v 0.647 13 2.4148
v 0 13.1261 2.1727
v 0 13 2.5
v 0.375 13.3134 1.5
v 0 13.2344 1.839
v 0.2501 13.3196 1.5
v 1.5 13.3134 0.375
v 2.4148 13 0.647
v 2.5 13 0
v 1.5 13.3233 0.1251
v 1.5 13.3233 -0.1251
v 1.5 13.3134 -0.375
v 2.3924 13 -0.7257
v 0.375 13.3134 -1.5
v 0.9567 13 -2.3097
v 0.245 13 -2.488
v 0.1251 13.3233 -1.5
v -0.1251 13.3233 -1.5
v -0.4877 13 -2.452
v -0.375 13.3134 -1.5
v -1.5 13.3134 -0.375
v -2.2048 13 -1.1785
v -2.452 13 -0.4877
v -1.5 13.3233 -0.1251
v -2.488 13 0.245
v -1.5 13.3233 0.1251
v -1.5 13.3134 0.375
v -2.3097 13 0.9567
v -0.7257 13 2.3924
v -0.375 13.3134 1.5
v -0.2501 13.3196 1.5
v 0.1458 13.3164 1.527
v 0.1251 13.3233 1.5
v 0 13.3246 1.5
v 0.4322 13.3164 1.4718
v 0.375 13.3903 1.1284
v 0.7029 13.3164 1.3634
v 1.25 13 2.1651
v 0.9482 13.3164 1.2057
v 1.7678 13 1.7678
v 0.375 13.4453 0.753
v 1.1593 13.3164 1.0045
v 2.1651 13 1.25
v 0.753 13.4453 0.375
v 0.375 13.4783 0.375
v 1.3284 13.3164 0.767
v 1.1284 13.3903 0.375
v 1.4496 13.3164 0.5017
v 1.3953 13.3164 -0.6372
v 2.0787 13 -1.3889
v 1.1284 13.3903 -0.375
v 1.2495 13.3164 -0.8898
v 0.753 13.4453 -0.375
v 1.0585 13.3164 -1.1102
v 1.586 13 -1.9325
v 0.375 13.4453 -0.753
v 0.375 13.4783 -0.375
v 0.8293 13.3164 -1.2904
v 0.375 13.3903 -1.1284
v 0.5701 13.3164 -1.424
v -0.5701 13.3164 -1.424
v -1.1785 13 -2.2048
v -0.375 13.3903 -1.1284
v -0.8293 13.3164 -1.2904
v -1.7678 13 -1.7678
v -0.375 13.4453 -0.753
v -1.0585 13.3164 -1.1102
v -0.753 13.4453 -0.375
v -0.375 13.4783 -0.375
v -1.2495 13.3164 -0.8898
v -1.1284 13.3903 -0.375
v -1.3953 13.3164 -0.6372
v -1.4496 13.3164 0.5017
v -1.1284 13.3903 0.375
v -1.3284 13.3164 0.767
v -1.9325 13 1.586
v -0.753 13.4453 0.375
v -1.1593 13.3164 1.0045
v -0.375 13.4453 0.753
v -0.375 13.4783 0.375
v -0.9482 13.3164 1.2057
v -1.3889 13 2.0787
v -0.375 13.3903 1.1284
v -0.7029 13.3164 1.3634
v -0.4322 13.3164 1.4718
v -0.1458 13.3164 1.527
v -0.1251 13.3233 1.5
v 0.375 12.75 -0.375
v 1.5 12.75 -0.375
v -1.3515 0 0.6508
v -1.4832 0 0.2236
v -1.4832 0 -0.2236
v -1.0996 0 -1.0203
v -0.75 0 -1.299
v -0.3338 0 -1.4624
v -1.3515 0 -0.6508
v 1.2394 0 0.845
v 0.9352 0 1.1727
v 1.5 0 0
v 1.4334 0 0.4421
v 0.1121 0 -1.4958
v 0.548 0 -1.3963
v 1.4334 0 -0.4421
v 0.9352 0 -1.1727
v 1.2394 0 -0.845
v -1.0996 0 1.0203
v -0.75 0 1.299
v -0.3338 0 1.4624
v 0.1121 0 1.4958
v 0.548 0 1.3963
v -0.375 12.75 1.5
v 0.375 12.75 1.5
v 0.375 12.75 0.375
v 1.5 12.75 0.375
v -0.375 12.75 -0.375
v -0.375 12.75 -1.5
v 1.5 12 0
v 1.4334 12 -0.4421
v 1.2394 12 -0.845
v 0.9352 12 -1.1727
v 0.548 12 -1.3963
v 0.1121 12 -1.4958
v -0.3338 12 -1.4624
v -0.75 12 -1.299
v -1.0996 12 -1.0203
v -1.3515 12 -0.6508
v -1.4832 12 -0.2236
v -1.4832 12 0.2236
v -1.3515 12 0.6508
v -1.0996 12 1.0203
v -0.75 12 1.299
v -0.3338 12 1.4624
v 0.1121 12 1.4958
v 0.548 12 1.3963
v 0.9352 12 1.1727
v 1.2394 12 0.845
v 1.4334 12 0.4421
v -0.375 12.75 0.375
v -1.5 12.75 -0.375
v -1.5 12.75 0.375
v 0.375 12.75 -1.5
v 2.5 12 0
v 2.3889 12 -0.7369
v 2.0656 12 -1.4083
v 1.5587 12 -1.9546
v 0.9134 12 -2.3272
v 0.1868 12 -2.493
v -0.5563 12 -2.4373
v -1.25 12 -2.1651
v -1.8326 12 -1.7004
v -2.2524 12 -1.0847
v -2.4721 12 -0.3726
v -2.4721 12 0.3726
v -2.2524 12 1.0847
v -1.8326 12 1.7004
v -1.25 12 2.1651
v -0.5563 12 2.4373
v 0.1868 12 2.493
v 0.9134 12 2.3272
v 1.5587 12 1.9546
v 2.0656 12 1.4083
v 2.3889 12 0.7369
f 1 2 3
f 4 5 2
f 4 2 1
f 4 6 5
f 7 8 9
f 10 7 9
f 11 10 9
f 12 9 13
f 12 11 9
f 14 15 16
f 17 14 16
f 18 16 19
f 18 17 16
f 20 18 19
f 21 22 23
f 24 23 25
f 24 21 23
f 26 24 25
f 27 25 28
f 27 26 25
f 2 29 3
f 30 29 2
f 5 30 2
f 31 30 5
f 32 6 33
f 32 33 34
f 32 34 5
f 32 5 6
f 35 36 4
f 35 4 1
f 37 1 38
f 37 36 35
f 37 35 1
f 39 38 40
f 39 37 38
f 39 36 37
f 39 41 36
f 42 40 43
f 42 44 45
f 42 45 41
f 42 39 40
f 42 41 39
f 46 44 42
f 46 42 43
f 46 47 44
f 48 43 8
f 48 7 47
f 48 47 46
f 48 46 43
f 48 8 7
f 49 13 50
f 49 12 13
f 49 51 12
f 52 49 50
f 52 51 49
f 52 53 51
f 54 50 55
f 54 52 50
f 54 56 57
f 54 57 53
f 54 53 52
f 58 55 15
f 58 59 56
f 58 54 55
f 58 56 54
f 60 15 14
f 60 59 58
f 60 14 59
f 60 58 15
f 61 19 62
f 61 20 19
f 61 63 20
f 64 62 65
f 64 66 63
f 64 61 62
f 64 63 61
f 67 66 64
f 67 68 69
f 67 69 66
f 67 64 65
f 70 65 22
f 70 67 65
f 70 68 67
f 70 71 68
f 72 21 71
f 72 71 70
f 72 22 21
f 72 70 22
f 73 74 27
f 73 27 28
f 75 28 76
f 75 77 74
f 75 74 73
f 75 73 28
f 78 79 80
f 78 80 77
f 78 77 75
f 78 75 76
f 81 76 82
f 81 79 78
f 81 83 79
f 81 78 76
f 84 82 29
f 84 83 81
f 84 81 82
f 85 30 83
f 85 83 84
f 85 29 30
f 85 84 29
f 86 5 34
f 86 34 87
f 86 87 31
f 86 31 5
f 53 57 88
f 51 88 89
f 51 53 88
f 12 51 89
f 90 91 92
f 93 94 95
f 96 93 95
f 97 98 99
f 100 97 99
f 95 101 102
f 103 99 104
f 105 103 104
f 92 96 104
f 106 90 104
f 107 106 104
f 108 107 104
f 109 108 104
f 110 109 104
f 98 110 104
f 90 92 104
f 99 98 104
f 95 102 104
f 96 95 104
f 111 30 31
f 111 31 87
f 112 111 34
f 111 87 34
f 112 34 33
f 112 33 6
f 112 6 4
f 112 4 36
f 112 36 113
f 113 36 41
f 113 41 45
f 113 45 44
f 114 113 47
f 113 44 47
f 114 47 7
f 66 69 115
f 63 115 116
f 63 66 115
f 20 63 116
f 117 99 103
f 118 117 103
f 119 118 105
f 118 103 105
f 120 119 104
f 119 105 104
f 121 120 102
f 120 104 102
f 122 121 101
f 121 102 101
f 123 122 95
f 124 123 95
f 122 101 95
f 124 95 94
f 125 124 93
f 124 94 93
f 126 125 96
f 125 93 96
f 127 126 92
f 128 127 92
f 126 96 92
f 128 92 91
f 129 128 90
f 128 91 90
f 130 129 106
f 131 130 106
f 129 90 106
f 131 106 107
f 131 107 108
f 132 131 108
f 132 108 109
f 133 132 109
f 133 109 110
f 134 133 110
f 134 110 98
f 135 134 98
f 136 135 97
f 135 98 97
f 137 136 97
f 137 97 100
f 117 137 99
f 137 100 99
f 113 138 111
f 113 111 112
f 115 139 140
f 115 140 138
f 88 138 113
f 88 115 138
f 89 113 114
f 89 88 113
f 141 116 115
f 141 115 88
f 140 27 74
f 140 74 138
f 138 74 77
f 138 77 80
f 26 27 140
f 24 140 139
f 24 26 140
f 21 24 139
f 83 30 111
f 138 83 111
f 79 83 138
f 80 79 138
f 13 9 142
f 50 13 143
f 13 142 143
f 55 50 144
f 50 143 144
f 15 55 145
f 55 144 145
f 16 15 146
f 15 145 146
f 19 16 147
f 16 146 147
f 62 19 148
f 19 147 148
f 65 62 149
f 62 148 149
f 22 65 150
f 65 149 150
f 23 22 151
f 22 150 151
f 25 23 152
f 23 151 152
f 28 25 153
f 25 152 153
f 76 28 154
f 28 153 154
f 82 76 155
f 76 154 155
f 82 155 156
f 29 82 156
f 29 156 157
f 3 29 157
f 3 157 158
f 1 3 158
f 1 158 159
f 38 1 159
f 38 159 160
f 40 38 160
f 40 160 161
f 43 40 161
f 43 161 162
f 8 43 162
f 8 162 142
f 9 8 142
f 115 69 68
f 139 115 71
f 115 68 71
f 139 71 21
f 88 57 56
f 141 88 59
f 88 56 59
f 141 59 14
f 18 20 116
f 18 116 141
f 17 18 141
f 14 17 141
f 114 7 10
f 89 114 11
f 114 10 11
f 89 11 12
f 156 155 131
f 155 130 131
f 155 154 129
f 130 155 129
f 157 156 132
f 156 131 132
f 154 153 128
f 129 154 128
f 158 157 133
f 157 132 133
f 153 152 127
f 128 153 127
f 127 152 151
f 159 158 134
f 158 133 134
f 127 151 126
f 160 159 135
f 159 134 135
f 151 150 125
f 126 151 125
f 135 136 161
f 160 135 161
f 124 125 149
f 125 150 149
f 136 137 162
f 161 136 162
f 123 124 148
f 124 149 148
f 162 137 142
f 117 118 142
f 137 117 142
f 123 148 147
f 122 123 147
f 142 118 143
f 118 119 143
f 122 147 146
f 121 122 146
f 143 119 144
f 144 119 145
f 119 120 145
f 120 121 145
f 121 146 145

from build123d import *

# Parameters (mm, degrees)
SKETCH1_R           = 1.5
BOSS_EXTRUDE1_DEPTH = 12
SKETCH2_R           = 2.5
BOSS_EXTRUDE2_DEPTH = 1
DOME1_FACE_RADIUS   = 2.5
DOME1_HEIGHT        = 0.5
SKETCH3_W           = 1.125
SKETCH3_H           = 0.75
SKETCH3_W_2         = 0.75
SKETCH3_H_2         = 1.125
CUT_EXTRUDE1_DEPTH  = 0.75


with BuildPart() as part:
    # Sketch1 → Boss-Extrude1 (new body)
    with BuildSketch(Plane(origin=(0, 0, 0), x_dir=(1, 0, 0), z_dir=(0, 1, 0))):
        Circle(SKETCH1_R)
    extrude(amount=BOSS_EXTRUDE1_DEPTH)

    # Sketch2 → Boss-Extrude2 (add)
    with BuildSketch(Plane(origin=(0, 12, 0), x_dir=(1, 0, 0), z_dir=(0, 1, 0))):
        Circle(SKETCH2_R)
    extrude(amount=BOSS_EXTRUDE2_DEPTH)

    # Dome1: a dome of height H over a round flat face of radius A is a cap of a sphere of radius (A * A + H * H) / (2 * H)
    dome1_r = (DOME1_FACE_RADIUS * DOME1_FACE_RADIUS + DOME1_HEIGHT * DOME1_HEIGHT) / (2 * DOME1_HEIGHT)
    dome1_base = Plane((0, 13, 0), z_dir=(0, 1, 0))
    with Locations(dome1_base.offset(DOME1_HEIGHT - dome1_r)):
        dome1_ball = Sphere(dome1_r, mode=Mode.PRIVATE)
    add(split(dome1_ball, bisect_by=dome1_base, keep=Keep.TOP, mode=Mode.PRIVATE))

    # Sketch3 → Cut-Extrude1 (cut)
    with BuildSketch(Plane(origin=(0, 13.5, 0), x_dir=(1, 0, 0), z_dir=(0, 1, 0))):
        with Locations((-0.9375, 0)):
            Rectangle(SKETCH3_W, SKETCH3_H)
        Rectangle(SKETCH3_W_2, SKETCH3_H)
        with Locations((0, 0.9375)):
            Rectangle(SKETCH3_W_2, SKETCH3_H_2)
        with Locations((0.9375, 0)):
            Rectangle(SKETCH3_W, SKETCH3_H)
        with Locations((0, -0.9375)):
            Rectangle(SKETCH3_W_2, SKETCH3_H_2)
    extrude(amount=-CUT_EXTRUDE1_DEPTH, mode=Mode.SUBTRACT)


solid = part.part
